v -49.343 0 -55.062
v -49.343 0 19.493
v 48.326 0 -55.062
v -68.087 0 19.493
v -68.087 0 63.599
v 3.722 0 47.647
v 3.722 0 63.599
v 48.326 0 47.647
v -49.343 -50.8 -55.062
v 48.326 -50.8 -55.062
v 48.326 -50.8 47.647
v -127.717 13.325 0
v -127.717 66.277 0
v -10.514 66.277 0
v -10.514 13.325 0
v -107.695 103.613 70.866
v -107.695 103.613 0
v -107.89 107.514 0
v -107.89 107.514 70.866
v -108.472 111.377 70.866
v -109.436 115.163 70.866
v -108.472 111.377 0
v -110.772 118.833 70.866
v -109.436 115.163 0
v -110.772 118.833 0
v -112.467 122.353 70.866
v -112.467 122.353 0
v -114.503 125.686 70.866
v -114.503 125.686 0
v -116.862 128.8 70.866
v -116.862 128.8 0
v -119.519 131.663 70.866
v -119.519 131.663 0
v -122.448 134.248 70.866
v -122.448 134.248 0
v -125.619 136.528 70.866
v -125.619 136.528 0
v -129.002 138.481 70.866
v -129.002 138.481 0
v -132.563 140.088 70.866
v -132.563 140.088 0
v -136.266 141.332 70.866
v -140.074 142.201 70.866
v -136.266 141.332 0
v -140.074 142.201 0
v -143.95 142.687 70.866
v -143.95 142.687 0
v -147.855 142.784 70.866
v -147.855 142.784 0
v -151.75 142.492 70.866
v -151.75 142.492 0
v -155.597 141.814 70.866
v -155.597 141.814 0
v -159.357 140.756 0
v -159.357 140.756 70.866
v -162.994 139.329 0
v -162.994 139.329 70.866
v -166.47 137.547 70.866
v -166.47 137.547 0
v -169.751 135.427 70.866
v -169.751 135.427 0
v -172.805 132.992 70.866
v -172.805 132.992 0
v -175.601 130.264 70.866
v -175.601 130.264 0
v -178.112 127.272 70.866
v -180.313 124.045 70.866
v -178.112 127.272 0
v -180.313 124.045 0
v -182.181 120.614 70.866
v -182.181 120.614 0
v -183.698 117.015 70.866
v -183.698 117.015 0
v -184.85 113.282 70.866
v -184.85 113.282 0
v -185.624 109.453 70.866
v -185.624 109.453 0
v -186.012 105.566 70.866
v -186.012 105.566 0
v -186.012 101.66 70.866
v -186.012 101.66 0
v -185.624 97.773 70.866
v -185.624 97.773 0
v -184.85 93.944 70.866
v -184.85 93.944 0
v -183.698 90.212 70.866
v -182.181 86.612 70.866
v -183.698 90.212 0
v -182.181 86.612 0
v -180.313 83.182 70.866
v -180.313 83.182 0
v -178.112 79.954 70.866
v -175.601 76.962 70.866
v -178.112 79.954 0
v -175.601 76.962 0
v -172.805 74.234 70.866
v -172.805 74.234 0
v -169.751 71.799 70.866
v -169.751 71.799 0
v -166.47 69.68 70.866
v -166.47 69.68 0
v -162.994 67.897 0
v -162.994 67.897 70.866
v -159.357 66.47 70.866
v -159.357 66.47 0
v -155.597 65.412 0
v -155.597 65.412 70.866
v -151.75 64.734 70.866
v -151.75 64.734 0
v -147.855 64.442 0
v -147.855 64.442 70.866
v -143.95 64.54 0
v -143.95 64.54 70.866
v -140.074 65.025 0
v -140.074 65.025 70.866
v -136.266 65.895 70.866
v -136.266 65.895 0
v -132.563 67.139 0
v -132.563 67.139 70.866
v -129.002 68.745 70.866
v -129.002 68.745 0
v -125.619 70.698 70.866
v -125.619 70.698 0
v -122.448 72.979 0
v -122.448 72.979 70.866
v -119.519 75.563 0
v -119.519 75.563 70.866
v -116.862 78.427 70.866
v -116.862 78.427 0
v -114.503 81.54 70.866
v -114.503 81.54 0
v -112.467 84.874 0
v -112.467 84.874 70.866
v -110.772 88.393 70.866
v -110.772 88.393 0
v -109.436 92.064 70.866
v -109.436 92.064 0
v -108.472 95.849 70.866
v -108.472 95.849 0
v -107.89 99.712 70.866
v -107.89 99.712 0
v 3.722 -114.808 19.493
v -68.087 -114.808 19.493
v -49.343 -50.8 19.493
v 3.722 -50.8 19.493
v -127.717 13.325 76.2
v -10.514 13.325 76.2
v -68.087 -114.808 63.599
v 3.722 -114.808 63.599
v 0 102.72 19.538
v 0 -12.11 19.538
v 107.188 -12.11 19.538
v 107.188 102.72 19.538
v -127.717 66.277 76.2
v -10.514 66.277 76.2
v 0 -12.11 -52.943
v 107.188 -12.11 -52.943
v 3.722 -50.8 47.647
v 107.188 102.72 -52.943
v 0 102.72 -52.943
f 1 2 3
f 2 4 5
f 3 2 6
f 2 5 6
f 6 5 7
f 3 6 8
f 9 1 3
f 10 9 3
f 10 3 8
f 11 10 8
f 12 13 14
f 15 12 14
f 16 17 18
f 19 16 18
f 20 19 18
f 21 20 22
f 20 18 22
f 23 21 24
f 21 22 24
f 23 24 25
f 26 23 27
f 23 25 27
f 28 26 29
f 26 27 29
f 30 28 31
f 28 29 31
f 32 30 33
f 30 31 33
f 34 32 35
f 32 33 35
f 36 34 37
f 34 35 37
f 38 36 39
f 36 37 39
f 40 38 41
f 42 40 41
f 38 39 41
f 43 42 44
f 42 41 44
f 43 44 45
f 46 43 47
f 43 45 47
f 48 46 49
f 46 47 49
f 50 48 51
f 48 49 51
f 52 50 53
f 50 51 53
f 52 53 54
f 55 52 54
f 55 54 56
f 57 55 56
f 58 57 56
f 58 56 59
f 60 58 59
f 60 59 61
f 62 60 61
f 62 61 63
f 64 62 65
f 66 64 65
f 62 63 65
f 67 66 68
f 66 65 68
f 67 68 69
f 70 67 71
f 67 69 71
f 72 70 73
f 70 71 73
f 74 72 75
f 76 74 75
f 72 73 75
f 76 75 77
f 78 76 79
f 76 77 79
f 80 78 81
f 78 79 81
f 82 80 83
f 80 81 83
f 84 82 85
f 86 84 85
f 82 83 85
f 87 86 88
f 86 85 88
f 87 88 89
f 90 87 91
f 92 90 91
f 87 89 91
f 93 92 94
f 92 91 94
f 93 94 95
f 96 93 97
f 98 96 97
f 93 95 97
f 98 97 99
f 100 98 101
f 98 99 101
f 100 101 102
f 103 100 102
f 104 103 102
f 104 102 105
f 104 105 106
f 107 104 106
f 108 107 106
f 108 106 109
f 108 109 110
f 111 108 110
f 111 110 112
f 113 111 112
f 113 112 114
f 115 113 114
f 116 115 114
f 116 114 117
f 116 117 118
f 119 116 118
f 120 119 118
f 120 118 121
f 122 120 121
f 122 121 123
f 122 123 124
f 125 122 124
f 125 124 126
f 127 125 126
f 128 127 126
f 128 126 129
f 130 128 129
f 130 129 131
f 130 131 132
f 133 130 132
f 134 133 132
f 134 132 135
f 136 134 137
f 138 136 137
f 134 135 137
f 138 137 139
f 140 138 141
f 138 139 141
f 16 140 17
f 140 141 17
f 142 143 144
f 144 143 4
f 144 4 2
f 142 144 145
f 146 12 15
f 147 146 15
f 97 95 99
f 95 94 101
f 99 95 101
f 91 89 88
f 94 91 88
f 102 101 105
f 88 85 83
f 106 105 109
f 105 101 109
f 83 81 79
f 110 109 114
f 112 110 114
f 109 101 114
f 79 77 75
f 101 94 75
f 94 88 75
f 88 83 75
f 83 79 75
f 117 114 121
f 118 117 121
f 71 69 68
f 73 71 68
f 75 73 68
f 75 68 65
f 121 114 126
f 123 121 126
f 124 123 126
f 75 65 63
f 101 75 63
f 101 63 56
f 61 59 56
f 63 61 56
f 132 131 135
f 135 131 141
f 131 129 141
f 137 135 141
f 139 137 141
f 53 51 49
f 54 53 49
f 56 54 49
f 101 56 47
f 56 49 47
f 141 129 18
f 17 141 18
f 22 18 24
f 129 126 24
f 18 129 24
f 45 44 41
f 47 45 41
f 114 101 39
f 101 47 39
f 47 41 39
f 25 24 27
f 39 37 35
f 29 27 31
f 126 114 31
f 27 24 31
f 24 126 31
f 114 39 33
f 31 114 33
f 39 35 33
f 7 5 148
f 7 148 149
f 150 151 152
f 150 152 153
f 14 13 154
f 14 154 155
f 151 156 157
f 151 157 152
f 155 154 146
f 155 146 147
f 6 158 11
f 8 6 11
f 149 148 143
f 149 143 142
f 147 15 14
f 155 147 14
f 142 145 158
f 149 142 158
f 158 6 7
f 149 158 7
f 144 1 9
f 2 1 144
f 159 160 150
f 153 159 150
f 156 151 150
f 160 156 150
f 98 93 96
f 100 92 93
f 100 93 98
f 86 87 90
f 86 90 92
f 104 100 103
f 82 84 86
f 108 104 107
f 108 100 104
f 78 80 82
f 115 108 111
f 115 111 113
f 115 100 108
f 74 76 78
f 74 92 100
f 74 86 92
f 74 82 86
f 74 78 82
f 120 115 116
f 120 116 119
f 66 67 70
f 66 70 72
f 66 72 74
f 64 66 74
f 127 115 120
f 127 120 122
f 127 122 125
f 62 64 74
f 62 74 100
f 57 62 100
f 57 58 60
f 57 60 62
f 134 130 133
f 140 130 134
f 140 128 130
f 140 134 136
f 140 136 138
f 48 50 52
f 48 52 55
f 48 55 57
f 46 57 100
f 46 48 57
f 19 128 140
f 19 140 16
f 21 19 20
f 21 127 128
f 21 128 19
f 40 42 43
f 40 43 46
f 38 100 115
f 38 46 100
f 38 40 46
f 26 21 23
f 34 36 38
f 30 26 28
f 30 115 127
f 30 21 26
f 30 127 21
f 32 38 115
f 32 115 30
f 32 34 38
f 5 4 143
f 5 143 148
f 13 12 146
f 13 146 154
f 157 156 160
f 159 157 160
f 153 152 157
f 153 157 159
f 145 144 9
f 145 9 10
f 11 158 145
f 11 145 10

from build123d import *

# Parameters (mm, degrees)
F0_W     = 97.668778
F0_H     = 102.708745
F1_DEPTH = 50.8
F2_W     = 71.808368
F2_H     = 44.105816
F4_DEPTH = 114.808
F3_W     = 117.202788
F3_H     = 52.951805
F5_DEPTH = 76.2
F6_W     = 114.829555
F6_H     = 72.480843
F7_DEPTH = 107.188
F8_R     = 39.1831
F9_DEPTH = 70.866


with BuildPart() as f1:
    # F0 (on Front) → F1 (new body)
    with BuildSketch(Plane.XZ):
        with Locations((-0.50869, -3.707687)):
            Rectangle(F0_W, F0_H)
    extrude(amount=F1_DEPTH)

    # F2 (on Front) → F4 (join)
    with BuildSketch(Plane.XZ):
        with Locations((-32.18241, 41.546328)):
            Rectangle(F2_W, F2_H)
    extrude(amount=F4_DEPTH)


with BuildPart() as f5:
    # F3 (on Top) → F5 (new body)
    with BuildSketch(Plane.XY):
        with Locations((-69.115445, 39.801325)):
            Rectangle(F3_W, F3_H)
    extrude(amount=F5_DEPTH)


with BuildPart() as f7:
    # F6 (on Right) → F7 (new body)
    with BuildSketch(Plane.YZ):
        with Locations((45.305155, -16.70282)):
            Rectangle(F6_W, F6_H)
    extrude(amount=F7_DEPTH)


with BuildPart() as f9:
    # F8 (on Top) → F9 (new body)
    with BuildSketch(Plane.XY):
        with Locations((-146.878064, 103.613123)):
            Circle(F8_R)
    extrude(amount=F9_DEPTH)


solid = Compound([f1.part, f5.part, f7.part, f9.part])
